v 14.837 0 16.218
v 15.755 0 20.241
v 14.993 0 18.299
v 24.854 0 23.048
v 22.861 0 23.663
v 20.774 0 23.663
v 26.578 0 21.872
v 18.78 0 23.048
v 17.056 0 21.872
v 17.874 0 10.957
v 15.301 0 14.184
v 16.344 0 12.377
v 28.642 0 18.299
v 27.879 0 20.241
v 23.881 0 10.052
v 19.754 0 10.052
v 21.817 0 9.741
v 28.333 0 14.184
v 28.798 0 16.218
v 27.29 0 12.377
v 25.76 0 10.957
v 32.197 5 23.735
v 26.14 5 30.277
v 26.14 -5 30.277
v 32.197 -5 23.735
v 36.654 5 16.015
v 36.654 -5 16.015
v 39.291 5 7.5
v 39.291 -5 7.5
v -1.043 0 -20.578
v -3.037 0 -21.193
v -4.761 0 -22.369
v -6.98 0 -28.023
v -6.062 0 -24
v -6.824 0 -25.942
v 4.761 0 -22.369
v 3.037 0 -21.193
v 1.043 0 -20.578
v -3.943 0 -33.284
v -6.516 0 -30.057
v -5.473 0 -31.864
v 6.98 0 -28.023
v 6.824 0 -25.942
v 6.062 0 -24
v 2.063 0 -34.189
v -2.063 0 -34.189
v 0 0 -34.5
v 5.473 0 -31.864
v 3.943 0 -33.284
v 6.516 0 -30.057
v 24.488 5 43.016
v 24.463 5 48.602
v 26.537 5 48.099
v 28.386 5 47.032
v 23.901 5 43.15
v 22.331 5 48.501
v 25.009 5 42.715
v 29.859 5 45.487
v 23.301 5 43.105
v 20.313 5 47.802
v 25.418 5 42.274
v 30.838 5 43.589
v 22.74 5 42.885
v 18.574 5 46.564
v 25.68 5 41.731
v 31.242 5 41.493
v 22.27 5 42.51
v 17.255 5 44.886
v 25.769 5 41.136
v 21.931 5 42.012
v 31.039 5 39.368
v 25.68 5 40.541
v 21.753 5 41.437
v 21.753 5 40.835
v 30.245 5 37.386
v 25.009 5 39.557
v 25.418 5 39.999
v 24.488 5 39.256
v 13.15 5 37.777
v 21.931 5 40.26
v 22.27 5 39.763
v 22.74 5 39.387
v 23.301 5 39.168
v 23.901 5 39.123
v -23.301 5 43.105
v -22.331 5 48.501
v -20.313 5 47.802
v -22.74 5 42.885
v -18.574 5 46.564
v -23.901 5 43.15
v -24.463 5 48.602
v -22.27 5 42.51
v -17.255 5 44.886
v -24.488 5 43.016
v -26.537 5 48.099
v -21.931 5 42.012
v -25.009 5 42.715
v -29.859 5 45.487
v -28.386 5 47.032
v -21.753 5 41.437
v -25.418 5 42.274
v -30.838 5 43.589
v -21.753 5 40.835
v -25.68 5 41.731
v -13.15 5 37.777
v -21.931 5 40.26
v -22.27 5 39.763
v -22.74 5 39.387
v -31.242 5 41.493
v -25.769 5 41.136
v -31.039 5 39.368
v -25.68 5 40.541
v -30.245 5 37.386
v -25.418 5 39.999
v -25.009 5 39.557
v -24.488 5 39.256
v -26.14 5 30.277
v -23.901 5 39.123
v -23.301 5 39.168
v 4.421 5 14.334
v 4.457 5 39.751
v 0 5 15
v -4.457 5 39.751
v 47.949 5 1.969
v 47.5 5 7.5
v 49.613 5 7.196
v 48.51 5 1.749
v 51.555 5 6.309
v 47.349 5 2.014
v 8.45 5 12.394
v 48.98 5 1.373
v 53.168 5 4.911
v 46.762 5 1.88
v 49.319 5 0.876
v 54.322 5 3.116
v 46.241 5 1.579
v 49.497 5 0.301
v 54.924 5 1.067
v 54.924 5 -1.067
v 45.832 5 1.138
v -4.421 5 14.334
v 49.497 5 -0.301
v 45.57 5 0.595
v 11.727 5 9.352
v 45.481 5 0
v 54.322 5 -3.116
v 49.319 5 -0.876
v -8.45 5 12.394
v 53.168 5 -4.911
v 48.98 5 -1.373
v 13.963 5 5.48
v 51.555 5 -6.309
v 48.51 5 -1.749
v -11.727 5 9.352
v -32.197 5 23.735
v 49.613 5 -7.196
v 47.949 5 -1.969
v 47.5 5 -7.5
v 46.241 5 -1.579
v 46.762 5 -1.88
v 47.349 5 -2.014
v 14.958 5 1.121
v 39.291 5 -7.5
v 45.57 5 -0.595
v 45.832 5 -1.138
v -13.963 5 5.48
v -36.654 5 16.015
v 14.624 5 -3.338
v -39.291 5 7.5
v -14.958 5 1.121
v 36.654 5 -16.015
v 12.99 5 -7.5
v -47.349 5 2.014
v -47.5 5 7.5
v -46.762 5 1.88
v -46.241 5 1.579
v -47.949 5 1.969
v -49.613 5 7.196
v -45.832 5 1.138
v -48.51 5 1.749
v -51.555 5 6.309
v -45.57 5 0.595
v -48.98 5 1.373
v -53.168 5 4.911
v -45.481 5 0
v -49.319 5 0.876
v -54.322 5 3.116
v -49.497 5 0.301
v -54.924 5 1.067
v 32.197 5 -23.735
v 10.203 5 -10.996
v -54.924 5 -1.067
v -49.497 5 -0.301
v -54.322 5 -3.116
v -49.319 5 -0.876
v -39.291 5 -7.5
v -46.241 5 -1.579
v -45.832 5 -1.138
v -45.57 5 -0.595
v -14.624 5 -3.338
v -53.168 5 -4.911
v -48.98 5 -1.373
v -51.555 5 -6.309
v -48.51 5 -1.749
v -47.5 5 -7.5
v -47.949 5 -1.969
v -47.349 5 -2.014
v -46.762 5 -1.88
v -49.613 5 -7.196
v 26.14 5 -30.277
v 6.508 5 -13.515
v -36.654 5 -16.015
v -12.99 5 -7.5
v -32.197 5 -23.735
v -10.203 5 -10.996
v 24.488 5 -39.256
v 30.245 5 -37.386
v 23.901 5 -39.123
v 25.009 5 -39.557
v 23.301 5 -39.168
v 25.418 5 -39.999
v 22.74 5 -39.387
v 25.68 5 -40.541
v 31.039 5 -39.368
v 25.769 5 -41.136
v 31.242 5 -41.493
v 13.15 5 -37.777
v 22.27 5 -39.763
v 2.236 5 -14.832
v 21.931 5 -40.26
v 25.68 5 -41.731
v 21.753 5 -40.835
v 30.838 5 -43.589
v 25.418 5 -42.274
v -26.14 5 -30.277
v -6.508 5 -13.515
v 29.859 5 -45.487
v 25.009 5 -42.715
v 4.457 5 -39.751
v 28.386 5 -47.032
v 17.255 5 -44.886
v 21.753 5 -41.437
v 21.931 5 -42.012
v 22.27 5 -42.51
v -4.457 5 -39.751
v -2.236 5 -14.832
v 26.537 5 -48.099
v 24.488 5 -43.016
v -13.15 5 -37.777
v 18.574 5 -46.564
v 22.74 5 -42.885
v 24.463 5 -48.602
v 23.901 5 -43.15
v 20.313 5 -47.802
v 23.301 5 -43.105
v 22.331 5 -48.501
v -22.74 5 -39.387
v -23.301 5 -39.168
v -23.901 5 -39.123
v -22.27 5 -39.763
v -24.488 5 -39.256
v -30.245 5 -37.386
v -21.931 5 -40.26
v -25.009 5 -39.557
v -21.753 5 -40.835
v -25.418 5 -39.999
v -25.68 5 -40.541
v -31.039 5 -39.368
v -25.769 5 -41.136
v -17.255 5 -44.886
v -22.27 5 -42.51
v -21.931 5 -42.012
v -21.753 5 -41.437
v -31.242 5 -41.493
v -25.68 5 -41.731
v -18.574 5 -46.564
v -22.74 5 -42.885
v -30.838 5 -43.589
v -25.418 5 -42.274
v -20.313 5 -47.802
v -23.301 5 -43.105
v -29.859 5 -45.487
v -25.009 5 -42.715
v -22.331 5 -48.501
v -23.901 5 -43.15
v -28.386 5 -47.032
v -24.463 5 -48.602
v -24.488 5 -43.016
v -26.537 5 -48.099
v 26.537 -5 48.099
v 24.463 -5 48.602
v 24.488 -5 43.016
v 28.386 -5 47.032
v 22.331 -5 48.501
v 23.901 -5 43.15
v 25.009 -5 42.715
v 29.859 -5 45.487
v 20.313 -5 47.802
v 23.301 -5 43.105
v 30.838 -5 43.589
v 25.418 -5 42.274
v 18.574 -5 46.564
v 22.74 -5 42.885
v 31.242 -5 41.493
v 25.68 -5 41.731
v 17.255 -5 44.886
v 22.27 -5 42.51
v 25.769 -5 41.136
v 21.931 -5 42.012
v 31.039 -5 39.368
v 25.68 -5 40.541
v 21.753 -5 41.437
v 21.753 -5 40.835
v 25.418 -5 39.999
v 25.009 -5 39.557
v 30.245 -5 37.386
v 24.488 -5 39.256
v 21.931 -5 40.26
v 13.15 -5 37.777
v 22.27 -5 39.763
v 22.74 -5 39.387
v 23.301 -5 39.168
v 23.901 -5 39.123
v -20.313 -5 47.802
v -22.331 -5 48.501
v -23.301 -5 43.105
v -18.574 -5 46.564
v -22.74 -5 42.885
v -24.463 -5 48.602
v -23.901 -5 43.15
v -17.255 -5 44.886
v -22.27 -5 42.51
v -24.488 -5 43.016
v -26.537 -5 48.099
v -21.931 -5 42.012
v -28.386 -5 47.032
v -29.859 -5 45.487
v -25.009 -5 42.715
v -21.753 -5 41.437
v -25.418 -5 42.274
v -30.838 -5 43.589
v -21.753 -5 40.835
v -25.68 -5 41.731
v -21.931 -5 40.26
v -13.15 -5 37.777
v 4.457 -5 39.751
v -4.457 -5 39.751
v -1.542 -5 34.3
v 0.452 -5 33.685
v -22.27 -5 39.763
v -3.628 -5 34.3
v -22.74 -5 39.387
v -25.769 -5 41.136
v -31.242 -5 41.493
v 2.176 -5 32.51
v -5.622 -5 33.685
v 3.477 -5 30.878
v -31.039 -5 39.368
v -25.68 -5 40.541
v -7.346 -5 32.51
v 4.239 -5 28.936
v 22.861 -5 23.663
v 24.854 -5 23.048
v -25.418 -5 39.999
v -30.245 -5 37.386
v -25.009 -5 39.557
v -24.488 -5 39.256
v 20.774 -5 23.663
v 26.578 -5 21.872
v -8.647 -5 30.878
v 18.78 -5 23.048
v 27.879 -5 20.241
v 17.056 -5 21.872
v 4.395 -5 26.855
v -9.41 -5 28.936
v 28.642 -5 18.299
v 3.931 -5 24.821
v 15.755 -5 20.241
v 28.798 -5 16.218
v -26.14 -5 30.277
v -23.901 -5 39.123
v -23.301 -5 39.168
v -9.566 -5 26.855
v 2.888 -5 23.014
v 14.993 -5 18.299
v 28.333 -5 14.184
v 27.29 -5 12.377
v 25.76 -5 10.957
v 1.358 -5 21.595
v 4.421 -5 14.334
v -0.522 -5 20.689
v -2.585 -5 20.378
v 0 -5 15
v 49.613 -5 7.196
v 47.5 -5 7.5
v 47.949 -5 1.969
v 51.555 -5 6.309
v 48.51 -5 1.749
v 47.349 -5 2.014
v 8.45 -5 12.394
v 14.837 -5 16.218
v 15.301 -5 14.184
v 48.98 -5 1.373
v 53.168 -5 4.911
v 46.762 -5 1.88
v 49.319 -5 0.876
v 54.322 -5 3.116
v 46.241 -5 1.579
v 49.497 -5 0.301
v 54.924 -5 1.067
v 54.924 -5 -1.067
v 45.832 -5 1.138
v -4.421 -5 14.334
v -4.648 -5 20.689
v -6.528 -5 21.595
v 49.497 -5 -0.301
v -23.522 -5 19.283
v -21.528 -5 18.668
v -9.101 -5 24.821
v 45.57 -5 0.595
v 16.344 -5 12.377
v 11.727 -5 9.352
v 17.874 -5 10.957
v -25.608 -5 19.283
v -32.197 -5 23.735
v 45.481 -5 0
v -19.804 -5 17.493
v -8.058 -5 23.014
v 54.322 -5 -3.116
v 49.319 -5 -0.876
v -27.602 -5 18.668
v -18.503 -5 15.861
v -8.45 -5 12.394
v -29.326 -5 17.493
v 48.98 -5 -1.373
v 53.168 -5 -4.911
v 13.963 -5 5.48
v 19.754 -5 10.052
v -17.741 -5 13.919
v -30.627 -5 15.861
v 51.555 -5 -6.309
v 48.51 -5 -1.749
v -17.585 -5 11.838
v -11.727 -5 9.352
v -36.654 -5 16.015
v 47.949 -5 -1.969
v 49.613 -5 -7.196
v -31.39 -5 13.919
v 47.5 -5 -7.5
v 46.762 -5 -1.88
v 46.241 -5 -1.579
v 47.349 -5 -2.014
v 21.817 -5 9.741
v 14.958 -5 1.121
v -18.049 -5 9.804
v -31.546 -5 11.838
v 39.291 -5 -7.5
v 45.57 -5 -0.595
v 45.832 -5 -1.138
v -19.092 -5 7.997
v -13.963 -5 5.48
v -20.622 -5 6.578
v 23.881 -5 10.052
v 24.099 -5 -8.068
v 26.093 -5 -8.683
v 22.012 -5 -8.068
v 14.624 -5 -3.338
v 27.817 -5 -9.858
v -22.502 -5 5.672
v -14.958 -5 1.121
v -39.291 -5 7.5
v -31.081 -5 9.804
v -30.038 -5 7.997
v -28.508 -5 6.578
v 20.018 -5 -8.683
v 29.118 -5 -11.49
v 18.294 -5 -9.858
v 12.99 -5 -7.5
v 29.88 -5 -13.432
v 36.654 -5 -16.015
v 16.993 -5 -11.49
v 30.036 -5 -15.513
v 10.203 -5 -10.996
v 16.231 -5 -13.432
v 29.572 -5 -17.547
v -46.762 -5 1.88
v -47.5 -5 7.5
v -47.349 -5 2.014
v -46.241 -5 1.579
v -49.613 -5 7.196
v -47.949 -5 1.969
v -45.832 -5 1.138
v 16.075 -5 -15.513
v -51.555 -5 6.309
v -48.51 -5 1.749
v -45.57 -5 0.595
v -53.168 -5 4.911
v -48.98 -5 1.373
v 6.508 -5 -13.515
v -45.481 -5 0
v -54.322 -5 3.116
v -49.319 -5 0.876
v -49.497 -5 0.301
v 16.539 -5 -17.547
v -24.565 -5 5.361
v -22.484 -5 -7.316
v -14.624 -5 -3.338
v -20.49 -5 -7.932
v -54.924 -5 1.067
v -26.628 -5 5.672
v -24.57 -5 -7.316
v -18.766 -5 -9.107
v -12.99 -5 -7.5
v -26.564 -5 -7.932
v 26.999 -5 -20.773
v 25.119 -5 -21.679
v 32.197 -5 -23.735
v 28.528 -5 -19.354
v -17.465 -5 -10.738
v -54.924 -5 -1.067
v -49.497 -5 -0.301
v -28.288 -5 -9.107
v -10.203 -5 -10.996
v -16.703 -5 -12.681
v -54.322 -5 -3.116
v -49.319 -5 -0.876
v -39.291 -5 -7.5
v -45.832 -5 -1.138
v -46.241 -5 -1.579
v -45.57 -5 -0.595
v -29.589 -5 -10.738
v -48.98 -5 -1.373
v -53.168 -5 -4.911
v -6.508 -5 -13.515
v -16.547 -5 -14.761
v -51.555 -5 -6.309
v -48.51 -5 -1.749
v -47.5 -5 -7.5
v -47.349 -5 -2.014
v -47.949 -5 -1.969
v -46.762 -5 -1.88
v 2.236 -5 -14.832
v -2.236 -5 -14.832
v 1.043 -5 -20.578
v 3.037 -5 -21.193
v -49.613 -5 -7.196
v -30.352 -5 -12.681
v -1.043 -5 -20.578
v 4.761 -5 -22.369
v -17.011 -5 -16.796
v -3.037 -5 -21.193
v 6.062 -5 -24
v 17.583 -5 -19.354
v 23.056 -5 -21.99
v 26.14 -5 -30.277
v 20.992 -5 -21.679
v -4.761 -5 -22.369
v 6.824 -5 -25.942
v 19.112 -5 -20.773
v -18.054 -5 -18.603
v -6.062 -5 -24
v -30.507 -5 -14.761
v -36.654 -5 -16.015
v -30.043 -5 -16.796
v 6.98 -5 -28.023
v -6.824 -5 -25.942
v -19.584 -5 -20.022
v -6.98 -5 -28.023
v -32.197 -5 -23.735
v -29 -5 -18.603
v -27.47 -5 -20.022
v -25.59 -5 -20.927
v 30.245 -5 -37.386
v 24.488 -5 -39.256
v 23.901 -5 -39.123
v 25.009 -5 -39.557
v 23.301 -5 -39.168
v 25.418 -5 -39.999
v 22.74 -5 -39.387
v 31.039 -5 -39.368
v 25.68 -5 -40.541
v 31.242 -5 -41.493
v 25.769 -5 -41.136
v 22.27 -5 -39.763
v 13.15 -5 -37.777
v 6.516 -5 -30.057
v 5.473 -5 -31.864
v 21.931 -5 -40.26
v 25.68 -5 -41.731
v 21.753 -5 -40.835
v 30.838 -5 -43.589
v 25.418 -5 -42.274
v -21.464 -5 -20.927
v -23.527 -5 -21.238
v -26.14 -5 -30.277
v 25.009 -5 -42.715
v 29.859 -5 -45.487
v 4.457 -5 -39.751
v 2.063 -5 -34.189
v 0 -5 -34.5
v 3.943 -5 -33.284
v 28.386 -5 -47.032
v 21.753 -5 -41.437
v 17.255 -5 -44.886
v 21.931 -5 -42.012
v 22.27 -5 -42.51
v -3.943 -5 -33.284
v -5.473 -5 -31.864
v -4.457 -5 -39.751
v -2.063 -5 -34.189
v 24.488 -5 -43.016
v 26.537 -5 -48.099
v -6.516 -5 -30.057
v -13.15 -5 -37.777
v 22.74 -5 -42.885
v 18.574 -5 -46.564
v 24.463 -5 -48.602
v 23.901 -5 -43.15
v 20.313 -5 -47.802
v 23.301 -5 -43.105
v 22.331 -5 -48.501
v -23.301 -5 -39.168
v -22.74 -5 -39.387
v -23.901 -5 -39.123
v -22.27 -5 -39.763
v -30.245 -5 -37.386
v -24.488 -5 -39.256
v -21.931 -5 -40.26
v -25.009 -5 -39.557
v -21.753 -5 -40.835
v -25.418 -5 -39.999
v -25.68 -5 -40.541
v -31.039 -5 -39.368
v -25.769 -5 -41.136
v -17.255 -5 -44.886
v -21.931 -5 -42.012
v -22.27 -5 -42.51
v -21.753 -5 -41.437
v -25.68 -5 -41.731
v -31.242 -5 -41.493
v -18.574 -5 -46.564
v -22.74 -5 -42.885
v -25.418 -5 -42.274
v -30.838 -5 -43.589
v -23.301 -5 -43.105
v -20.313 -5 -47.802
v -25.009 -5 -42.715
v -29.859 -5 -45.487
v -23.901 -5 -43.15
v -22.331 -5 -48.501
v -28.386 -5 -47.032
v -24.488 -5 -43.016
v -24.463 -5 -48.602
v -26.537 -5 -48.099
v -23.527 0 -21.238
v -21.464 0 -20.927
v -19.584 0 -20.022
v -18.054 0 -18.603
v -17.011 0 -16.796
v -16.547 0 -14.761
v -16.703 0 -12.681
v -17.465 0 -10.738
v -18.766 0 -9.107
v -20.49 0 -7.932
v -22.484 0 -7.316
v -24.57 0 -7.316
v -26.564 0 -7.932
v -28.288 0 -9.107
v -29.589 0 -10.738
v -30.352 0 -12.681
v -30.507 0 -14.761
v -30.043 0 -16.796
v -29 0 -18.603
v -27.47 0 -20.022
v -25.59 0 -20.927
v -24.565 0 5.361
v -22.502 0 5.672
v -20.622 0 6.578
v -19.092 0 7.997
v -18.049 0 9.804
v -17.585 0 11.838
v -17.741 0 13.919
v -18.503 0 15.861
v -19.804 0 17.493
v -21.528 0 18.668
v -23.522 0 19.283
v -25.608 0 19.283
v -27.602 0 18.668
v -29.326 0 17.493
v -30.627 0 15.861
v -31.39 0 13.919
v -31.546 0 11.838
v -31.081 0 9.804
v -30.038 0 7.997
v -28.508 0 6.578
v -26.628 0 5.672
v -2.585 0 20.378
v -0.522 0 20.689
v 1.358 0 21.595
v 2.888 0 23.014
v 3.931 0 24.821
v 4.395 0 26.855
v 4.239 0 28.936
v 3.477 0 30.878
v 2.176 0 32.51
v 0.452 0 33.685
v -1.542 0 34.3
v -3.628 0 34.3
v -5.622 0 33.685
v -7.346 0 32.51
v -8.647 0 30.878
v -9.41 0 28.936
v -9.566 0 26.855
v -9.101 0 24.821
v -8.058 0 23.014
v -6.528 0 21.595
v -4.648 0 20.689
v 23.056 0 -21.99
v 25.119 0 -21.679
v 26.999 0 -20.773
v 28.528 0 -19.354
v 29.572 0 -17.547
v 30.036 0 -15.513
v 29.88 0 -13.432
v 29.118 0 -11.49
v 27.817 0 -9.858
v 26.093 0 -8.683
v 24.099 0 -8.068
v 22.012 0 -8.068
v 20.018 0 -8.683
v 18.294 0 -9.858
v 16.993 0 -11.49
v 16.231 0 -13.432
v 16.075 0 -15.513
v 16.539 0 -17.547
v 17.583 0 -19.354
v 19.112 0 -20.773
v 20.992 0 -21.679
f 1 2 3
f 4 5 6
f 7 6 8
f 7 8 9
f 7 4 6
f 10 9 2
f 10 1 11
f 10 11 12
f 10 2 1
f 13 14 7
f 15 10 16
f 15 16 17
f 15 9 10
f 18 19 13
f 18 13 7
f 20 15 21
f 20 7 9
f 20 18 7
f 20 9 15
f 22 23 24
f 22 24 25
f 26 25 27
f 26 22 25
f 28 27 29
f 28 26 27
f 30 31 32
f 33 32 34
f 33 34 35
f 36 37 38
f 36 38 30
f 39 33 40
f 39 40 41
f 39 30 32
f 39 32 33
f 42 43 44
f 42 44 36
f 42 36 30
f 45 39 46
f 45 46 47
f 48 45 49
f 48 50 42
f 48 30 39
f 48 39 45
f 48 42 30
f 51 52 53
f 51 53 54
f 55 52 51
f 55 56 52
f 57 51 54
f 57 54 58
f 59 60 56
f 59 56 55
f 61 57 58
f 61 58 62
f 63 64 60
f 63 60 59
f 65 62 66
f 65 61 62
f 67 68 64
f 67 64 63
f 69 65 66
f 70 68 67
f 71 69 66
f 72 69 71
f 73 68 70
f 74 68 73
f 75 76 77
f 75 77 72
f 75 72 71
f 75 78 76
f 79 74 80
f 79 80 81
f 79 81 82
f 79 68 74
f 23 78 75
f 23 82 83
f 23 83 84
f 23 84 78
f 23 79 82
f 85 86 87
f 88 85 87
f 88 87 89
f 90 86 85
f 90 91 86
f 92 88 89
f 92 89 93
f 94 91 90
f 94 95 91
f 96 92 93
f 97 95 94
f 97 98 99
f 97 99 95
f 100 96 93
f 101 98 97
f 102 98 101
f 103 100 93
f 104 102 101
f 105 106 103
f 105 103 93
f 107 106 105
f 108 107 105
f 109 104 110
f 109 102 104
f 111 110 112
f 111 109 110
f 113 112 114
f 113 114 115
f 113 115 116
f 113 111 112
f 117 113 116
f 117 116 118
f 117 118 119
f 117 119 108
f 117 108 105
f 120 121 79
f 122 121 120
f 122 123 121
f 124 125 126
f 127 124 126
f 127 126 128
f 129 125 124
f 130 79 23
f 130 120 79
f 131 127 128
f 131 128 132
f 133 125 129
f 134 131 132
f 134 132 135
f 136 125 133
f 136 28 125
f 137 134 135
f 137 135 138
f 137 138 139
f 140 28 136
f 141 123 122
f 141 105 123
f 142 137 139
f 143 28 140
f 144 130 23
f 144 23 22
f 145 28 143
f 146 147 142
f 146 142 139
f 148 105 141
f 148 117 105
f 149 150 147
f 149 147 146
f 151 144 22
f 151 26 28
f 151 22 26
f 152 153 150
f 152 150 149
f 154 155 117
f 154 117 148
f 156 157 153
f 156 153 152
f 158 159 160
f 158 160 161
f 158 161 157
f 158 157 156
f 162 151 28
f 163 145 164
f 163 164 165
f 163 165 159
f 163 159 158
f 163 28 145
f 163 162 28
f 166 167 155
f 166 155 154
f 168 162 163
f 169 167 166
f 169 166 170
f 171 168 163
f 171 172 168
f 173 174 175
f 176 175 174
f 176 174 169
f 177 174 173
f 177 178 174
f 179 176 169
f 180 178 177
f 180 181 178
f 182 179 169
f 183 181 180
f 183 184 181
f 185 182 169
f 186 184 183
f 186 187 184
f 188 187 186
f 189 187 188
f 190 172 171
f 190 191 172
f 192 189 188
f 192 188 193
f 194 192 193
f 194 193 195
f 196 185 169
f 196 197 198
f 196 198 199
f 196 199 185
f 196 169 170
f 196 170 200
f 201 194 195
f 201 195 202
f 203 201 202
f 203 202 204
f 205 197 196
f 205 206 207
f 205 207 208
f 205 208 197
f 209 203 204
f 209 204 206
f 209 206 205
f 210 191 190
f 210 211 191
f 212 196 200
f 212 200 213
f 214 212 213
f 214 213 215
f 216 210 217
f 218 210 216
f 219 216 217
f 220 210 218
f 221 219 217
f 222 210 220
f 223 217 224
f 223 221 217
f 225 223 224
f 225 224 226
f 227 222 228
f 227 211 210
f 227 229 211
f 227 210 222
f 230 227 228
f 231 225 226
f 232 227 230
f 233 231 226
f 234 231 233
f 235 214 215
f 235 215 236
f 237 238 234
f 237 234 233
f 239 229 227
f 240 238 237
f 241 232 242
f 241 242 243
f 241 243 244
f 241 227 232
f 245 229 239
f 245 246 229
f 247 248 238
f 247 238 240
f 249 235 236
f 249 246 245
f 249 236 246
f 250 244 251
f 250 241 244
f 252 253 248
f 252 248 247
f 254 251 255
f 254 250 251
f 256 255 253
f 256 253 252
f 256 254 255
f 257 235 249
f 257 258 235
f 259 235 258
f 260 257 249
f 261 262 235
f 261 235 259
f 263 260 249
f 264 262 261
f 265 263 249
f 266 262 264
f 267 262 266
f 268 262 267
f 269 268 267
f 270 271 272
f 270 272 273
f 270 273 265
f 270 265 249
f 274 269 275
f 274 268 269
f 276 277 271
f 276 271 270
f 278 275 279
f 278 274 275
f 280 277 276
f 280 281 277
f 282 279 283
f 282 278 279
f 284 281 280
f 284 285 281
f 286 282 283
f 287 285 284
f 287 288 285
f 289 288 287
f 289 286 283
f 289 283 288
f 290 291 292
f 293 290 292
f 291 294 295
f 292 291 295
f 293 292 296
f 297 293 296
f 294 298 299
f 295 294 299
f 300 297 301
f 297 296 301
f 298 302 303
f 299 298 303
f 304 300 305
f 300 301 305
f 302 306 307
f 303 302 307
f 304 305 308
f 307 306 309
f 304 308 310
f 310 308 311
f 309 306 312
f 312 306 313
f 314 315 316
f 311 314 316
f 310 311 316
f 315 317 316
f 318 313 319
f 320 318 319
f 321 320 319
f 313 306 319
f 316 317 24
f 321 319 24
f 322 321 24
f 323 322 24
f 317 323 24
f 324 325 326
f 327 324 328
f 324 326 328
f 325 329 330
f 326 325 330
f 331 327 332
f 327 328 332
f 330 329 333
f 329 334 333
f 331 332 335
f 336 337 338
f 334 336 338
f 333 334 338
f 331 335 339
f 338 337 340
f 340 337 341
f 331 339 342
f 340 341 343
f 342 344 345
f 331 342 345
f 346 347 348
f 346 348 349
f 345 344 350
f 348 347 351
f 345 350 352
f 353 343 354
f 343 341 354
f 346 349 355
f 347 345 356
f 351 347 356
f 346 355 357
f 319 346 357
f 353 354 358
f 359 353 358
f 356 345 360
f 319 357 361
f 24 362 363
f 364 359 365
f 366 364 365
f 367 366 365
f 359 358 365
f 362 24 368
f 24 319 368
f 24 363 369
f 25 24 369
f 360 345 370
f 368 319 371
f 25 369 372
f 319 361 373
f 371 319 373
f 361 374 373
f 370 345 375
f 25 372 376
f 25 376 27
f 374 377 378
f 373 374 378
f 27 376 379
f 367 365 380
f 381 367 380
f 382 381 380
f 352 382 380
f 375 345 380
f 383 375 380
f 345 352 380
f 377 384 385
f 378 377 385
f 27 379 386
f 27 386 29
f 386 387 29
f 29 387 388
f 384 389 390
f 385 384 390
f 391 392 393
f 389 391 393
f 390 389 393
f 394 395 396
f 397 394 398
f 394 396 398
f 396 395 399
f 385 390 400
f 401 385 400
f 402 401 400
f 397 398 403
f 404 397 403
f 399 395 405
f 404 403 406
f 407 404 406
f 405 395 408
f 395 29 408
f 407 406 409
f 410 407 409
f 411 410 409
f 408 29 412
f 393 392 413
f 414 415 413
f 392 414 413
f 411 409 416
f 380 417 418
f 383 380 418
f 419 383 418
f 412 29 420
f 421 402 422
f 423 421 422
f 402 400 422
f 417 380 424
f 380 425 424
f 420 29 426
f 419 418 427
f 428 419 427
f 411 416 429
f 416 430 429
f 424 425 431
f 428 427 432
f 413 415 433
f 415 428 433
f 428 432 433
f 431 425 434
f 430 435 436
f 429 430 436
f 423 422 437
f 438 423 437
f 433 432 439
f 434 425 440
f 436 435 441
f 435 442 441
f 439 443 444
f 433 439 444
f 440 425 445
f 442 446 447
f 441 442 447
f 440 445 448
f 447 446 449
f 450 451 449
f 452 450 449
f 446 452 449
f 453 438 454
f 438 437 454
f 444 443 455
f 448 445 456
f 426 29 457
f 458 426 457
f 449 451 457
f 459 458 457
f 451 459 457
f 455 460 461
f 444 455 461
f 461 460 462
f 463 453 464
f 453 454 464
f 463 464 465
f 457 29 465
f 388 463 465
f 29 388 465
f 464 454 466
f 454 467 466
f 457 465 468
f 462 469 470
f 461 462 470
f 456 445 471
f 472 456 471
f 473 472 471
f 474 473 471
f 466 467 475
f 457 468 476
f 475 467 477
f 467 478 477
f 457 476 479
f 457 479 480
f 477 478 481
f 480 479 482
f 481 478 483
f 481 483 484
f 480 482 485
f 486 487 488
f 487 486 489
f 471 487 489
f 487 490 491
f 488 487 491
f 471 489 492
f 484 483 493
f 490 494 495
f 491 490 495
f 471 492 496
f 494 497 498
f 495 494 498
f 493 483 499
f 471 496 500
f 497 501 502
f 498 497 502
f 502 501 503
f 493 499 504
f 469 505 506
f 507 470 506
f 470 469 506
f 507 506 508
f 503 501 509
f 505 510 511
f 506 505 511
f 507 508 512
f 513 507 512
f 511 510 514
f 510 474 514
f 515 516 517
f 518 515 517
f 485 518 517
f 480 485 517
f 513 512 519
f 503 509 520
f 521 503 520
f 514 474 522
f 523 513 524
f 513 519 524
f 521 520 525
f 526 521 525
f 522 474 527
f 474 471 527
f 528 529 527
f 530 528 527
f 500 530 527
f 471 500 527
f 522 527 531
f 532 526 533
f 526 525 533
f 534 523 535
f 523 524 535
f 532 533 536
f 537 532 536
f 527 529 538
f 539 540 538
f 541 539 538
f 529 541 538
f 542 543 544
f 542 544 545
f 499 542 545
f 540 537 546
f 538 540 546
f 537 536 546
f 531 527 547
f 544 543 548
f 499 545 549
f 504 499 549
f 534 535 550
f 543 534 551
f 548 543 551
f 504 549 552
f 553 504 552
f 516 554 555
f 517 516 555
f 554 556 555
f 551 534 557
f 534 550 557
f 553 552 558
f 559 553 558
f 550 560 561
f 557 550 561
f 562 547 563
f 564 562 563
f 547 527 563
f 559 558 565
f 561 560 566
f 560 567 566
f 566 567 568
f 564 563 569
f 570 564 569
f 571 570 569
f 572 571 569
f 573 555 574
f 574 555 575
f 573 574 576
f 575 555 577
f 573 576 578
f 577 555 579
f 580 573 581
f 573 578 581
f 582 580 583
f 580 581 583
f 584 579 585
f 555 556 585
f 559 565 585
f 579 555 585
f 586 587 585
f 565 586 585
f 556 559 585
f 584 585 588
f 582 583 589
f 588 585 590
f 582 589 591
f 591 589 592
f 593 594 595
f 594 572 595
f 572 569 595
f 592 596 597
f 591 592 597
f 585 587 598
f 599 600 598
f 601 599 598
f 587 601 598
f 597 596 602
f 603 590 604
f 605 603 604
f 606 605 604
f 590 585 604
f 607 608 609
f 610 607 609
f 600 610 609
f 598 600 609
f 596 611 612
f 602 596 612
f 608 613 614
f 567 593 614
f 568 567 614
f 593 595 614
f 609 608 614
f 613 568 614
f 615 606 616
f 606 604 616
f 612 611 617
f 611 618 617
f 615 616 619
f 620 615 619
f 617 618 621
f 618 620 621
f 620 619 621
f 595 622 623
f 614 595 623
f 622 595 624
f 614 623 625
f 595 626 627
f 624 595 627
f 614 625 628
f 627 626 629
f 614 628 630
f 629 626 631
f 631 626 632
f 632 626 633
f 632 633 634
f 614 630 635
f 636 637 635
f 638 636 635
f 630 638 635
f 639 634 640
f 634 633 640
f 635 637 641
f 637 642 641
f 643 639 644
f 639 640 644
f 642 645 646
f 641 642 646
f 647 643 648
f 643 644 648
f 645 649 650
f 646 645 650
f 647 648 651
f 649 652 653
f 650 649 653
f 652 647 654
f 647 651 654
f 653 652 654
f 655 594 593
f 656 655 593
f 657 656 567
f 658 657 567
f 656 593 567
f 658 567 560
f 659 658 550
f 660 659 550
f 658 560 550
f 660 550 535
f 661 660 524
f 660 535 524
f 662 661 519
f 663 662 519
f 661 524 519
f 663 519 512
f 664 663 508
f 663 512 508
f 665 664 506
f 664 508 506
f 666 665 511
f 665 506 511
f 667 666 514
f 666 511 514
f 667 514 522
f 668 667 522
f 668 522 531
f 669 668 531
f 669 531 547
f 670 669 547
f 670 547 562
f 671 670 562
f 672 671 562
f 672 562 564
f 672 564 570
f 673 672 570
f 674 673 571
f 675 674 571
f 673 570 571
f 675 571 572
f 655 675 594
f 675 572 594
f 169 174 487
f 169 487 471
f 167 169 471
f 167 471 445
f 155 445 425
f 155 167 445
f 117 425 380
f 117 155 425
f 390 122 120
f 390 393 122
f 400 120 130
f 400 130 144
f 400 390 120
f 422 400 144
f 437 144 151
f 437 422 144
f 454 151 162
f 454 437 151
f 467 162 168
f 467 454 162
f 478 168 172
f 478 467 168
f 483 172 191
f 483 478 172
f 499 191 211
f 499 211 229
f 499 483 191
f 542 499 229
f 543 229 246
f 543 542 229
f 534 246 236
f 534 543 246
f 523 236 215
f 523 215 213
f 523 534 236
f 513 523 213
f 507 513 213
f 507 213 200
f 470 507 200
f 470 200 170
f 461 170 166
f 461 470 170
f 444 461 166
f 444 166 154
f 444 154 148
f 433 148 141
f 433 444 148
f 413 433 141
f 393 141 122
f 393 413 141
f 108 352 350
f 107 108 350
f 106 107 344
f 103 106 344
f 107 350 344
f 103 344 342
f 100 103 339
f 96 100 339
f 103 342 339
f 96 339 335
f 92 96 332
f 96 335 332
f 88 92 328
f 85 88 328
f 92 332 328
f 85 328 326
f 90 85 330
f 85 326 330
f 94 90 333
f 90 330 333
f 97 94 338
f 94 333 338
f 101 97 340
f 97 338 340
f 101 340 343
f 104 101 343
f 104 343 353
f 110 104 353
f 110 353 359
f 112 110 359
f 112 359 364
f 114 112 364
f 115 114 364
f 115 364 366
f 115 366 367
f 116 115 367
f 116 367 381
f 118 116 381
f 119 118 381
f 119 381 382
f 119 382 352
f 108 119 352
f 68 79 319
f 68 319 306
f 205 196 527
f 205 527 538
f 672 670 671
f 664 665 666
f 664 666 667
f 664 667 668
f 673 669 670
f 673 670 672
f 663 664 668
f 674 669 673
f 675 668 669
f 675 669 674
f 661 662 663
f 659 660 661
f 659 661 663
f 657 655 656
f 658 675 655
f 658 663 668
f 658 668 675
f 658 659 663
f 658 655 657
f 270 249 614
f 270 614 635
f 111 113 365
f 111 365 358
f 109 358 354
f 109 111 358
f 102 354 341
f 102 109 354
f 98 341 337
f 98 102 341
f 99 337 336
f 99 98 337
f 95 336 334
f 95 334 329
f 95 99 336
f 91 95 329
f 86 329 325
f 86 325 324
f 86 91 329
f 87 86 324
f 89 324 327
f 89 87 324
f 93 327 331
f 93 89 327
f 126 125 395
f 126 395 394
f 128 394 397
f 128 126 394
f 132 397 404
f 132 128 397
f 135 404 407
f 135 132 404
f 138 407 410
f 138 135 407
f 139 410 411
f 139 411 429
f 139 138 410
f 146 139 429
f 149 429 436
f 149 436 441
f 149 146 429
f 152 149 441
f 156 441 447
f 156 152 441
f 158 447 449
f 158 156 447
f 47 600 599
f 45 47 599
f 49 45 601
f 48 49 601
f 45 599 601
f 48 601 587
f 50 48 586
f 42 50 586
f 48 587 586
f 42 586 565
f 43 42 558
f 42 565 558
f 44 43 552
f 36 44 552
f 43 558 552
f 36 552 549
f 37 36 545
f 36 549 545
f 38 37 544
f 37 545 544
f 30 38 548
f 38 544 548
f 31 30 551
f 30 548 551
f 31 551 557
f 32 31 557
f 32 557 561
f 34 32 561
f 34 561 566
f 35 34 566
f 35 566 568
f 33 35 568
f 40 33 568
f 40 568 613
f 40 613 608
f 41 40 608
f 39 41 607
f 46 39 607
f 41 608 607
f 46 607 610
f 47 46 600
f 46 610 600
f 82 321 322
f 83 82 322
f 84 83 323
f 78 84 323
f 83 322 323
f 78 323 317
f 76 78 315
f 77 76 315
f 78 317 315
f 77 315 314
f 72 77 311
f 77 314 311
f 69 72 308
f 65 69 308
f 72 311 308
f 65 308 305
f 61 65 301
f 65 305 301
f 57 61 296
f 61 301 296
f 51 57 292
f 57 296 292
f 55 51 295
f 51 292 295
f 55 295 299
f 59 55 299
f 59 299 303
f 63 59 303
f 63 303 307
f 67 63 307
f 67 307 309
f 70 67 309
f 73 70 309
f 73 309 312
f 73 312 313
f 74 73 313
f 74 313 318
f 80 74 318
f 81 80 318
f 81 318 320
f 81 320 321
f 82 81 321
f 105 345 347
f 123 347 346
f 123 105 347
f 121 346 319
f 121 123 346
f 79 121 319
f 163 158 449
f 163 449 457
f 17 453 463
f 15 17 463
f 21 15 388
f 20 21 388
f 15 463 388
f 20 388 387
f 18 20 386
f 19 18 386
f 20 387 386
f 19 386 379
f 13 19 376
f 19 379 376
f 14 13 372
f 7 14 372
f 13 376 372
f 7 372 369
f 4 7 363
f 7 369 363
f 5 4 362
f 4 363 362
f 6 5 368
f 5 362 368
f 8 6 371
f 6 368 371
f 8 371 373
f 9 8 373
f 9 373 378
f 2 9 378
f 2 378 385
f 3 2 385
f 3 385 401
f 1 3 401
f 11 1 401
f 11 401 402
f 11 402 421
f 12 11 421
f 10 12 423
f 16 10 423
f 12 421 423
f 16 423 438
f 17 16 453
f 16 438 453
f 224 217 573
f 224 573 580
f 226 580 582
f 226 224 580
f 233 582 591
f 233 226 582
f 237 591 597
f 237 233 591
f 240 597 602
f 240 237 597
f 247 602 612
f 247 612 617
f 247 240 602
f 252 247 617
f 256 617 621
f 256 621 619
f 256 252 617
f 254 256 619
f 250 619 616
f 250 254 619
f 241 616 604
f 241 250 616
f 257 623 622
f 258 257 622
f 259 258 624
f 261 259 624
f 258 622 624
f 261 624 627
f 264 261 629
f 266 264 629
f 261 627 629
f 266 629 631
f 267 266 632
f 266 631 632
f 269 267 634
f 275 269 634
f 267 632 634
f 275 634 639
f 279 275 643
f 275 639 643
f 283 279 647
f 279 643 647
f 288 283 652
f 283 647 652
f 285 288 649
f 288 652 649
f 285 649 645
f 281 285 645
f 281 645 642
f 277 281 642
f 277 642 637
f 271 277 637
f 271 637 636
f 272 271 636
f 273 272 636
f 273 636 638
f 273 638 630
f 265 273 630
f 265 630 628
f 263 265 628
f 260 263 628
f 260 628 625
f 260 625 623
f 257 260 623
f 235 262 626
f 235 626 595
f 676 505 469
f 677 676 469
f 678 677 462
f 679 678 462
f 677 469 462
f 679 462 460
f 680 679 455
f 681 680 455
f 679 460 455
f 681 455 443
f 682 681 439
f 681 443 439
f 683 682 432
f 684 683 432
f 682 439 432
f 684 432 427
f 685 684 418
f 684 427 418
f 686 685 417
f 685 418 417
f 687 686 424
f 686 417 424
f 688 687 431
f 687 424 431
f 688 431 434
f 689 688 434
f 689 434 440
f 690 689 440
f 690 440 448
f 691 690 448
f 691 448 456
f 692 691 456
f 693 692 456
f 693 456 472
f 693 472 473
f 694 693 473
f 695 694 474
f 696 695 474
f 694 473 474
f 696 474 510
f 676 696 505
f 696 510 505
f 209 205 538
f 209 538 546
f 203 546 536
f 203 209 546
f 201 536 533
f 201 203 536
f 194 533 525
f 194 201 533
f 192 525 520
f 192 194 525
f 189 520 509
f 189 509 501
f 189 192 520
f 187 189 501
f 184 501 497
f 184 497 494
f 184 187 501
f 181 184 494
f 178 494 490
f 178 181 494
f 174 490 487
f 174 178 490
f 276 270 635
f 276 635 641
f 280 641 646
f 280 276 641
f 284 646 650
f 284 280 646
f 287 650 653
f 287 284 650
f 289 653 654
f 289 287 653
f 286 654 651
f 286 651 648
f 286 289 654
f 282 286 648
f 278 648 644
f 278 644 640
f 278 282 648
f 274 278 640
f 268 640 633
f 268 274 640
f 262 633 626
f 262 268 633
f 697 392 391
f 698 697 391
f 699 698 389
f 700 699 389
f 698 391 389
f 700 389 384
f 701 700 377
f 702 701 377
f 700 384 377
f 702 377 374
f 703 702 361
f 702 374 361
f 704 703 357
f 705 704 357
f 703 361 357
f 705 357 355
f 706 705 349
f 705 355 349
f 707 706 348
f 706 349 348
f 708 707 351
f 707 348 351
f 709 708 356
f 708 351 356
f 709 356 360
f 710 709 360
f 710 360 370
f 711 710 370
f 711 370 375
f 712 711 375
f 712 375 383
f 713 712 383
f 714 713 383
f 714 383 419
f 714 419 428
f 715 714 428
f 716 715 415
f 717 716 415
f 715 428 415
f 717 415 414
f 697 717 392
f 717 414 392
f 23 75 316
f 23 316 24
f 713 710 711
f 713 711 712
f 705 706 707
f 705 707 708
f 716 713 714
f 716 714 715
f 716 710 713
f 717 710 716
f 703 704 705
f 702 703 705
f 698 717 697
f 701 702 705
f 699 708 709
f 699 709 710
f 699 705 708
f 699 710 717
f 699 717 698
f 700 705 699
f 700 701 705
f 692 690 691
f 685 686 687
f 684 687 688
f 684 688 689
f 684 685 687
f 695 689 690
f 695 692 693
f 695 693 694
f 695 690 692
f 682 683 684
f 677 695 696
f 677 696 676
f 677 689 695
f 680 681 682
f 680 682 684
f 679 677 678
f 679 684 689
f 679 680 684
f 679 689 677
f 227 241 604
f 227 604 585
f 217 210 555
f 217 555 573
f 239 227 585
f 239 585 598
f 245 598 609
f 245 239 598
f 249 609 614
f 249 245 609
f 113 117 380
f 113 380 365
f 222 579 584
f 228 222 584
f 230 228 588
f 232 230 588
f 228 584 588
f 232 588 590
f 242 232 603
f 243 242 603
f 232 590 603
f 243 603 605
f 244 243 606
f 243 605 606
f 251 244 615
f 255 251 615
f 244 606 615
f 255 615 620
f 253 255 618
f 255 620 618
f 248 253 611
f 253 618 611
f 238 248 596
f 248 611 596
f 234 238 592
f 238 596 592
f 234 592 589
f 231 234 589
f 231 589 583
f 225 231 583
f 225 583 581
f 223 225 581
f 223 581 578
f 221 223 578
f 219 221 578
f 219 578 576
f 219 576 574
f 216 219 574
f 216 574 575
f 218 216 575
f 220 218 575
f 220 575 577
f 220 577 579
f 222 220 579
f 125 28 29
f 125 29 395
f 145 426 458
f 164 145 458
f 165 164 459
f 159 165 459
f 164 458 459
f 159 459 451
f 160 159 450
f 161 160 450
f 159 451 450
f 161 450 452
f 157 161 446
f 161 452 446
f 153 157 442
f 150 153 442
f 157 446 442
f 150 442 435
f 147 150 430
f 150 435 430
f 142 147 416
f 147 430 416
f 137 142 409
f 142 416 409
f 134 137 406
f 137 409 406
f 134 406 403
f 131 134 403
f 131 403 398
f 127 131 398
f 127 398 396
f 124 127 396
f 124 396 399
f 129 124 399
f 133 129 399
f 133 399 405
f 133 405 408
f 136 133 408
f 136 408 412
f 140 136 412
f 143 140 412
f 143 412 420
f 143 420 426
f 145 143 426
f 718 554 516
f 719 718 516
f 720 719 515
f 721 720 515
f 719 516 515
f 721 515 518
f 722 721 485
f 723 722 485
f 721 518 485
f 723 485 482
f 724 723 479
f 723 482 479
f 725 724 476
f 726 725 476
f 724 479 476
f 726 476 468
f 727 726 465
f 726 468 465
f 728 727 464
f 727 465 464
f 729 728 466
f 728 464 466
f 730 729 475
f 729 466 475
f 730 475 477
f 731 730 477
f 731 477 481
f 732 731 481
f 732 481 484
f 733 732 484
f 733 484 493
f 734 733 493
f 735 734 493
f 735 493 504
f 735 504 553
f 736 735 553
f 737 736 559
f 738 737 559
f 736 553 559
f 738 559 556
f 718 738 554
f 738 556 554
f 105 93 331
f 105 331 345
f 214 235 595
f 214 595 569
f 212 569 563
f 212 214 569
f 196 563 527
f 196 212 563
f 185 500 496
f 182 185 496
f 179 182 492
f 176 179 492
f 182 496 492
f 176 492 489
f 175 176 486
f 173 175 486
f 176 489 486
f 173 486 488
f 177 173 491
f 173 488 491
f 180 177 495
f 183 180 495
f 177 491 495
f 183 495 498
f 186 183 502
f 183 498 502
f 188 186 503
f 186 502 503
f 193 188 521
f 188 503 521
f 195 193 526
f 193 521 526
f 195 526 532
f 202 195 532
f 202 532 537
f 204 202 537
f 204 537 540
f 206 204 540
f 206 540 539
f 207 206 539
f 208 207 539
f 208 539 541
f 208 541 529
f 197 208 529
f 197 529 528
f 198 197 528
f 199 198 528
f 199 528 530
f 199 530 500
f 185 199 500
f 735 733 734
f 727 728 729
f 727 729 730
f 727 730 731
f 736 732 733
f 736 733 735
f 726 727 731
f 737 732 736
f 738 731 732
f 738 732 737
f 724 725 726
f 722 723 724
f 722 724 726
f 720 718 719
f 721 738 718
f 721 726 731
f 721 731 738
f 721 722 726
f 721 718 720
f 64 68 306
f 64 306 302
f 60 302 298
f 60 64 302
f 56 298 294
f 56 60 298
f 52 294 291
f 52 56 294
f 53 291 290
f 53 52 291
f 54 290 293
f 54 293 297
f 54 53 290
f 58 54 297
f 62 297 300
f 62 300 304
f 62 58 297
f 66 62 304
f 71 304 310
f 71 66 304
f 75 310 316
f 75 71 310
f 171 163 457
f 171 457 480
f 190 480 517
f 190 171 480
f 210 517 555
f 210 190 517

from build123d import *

# Parameters (mm, degrees)
SKETCH1_R                  = 25
SKETCH1_R_2                = 15
BOSS_EXTRUDE1_DEPTH        = 5
SKETCH6_R                  = 40
SKETCH6_R_2                = 25
BOSS_EXTRUDE3_DEPTH        = 10
SKETCH7_R                  = 7
CUT_EXTRUDE1_DEPTH         = 5
BOSS_EXTRUDE4_DEPTH        = 10
TAP_DRILL_FOR_10_32_TAP1_D = 4.0386
CIRPATTERN1_COUNT          = 6


with BuildPart() as part:
    # Sketch1 → Boss-Extrude1 (new, symmetric)
    with BuildSketch(Plane(origin=(0, 0, 0), x_dir=(1, 0, 0), z_dir=(0, 1, 0))):
        with Locations(Location((0, 0, 0), (0, 0, 270))):
            Circle(SKETCH1_R)
        with Locations(Location((0, 0, 0), (0, 0, 270))):
            Circle(SKETCH1_R_2, mode=Mode.SUBTRACT)
    extrude(amount=BOSS_EXTRUDE1_DEPTH, both=True)

    # Sketch6 → Boss-Extrude3 (add)
    with BuildSketch(Plane(origin=(0, 5, 0), x_dir=(1, 0, 0), z_dir=(0, 1, 0))):
        with Locations(Location((0, 0, 0), (0, 0, 270))):
            Circle(SKETCH6_R)
        Circle(SKETCH6_R_2, mode=Mode.SUBTRACT)
    extrude(amount=-BOSS_EXTRUDE3_DEPTH)

    # Sketch7 → Cut-Extrude1 (cut)
    with BuildSketch(Plane.XZ.offset(5)):
        with Locations(Location((21.817216858, 16.740939298, 0), (0, 0, 270))):
            Circle(SKETCH7_R)
        with Locations(Location((-2.585088545, 27.378227065, 0), (0, 0, 270))):
            Circle(SKETCH7_R)
        with Locations(Location((-24.565103939, 12.361458995, 0), (0, 0, 270))):
            Circle(SKETCH7_R)
        with Locations(Location((-23.52702738, -14.238292828, 0), (0, 0, 270))):
            Circle(SKETCH7_R)
        with Locations(Location((0, -27.5, 0), (0, 0, 270))):
            Circle(SKETCH7_R)
        with Locations(Location((23.055532132, -14.989744431, 0), (0, 0, 270))):
            Circle(SKETCH7_R)
    extrude(amount=-CUT_EXTRUDE1_DEPTH, mode=Mode.SUBTRACT)

    # Sketch8 → Boss-Extrude4 (add)
    with BuildSketch(Plane(origin=(0, 5, 0), x_dir=(1, 0, 0), z_dir=(0, 1, 0))):
        with BuildLine():
            Line((47.5, 7.5), (39.290584114, 7.5))
            Line((39.290584114, 7.5), (39.290584114, -7.5))
            Line((39.290584114, -7.5), (47.5, -7.5))
            ThreePointArc((47.5, -7.5), (55, 0), (47.5, 7.5))
        make_face()
    boss_extrude4 = extrude(amount=-BOSS_EXTRUDE4_DEPTH)

    # Tap Drill for #10-32 Tap1 (through all)
    with Locations(Plane(origin=(0, 5, 0), x_dir=(1, 0, 0), z_dir=(0, 1, 0))):
        with Locations((47.5, 0)):
            tap_drill_for_10_32_tap1 = Hole(TAP_DRILL_FOR_10_32_TAP1_D / 2)

    # CirPattern1: Boss-Extrude4, Tap Drill for #10-32 Tap1 ×6 about axis
    cirpattern1_axis = Axis((0, 0, 0), (0, 1, 0))
    add([boss_extrude4.rotate(cirpattern1_axis, i * 360 / CIRPATTERN1_COUNT) for i in range(1, CIRPATTERN1_COUNT)])
    add([tap_drill_for_10_32_tap1.rotate(cirpattern1_axis, i * 360 / CIRPATTERN1_COUNT) for i in range(1, CIRPATTERN1_COUNT)], mode=Mode.SUBTRACT)


solid = part.part
